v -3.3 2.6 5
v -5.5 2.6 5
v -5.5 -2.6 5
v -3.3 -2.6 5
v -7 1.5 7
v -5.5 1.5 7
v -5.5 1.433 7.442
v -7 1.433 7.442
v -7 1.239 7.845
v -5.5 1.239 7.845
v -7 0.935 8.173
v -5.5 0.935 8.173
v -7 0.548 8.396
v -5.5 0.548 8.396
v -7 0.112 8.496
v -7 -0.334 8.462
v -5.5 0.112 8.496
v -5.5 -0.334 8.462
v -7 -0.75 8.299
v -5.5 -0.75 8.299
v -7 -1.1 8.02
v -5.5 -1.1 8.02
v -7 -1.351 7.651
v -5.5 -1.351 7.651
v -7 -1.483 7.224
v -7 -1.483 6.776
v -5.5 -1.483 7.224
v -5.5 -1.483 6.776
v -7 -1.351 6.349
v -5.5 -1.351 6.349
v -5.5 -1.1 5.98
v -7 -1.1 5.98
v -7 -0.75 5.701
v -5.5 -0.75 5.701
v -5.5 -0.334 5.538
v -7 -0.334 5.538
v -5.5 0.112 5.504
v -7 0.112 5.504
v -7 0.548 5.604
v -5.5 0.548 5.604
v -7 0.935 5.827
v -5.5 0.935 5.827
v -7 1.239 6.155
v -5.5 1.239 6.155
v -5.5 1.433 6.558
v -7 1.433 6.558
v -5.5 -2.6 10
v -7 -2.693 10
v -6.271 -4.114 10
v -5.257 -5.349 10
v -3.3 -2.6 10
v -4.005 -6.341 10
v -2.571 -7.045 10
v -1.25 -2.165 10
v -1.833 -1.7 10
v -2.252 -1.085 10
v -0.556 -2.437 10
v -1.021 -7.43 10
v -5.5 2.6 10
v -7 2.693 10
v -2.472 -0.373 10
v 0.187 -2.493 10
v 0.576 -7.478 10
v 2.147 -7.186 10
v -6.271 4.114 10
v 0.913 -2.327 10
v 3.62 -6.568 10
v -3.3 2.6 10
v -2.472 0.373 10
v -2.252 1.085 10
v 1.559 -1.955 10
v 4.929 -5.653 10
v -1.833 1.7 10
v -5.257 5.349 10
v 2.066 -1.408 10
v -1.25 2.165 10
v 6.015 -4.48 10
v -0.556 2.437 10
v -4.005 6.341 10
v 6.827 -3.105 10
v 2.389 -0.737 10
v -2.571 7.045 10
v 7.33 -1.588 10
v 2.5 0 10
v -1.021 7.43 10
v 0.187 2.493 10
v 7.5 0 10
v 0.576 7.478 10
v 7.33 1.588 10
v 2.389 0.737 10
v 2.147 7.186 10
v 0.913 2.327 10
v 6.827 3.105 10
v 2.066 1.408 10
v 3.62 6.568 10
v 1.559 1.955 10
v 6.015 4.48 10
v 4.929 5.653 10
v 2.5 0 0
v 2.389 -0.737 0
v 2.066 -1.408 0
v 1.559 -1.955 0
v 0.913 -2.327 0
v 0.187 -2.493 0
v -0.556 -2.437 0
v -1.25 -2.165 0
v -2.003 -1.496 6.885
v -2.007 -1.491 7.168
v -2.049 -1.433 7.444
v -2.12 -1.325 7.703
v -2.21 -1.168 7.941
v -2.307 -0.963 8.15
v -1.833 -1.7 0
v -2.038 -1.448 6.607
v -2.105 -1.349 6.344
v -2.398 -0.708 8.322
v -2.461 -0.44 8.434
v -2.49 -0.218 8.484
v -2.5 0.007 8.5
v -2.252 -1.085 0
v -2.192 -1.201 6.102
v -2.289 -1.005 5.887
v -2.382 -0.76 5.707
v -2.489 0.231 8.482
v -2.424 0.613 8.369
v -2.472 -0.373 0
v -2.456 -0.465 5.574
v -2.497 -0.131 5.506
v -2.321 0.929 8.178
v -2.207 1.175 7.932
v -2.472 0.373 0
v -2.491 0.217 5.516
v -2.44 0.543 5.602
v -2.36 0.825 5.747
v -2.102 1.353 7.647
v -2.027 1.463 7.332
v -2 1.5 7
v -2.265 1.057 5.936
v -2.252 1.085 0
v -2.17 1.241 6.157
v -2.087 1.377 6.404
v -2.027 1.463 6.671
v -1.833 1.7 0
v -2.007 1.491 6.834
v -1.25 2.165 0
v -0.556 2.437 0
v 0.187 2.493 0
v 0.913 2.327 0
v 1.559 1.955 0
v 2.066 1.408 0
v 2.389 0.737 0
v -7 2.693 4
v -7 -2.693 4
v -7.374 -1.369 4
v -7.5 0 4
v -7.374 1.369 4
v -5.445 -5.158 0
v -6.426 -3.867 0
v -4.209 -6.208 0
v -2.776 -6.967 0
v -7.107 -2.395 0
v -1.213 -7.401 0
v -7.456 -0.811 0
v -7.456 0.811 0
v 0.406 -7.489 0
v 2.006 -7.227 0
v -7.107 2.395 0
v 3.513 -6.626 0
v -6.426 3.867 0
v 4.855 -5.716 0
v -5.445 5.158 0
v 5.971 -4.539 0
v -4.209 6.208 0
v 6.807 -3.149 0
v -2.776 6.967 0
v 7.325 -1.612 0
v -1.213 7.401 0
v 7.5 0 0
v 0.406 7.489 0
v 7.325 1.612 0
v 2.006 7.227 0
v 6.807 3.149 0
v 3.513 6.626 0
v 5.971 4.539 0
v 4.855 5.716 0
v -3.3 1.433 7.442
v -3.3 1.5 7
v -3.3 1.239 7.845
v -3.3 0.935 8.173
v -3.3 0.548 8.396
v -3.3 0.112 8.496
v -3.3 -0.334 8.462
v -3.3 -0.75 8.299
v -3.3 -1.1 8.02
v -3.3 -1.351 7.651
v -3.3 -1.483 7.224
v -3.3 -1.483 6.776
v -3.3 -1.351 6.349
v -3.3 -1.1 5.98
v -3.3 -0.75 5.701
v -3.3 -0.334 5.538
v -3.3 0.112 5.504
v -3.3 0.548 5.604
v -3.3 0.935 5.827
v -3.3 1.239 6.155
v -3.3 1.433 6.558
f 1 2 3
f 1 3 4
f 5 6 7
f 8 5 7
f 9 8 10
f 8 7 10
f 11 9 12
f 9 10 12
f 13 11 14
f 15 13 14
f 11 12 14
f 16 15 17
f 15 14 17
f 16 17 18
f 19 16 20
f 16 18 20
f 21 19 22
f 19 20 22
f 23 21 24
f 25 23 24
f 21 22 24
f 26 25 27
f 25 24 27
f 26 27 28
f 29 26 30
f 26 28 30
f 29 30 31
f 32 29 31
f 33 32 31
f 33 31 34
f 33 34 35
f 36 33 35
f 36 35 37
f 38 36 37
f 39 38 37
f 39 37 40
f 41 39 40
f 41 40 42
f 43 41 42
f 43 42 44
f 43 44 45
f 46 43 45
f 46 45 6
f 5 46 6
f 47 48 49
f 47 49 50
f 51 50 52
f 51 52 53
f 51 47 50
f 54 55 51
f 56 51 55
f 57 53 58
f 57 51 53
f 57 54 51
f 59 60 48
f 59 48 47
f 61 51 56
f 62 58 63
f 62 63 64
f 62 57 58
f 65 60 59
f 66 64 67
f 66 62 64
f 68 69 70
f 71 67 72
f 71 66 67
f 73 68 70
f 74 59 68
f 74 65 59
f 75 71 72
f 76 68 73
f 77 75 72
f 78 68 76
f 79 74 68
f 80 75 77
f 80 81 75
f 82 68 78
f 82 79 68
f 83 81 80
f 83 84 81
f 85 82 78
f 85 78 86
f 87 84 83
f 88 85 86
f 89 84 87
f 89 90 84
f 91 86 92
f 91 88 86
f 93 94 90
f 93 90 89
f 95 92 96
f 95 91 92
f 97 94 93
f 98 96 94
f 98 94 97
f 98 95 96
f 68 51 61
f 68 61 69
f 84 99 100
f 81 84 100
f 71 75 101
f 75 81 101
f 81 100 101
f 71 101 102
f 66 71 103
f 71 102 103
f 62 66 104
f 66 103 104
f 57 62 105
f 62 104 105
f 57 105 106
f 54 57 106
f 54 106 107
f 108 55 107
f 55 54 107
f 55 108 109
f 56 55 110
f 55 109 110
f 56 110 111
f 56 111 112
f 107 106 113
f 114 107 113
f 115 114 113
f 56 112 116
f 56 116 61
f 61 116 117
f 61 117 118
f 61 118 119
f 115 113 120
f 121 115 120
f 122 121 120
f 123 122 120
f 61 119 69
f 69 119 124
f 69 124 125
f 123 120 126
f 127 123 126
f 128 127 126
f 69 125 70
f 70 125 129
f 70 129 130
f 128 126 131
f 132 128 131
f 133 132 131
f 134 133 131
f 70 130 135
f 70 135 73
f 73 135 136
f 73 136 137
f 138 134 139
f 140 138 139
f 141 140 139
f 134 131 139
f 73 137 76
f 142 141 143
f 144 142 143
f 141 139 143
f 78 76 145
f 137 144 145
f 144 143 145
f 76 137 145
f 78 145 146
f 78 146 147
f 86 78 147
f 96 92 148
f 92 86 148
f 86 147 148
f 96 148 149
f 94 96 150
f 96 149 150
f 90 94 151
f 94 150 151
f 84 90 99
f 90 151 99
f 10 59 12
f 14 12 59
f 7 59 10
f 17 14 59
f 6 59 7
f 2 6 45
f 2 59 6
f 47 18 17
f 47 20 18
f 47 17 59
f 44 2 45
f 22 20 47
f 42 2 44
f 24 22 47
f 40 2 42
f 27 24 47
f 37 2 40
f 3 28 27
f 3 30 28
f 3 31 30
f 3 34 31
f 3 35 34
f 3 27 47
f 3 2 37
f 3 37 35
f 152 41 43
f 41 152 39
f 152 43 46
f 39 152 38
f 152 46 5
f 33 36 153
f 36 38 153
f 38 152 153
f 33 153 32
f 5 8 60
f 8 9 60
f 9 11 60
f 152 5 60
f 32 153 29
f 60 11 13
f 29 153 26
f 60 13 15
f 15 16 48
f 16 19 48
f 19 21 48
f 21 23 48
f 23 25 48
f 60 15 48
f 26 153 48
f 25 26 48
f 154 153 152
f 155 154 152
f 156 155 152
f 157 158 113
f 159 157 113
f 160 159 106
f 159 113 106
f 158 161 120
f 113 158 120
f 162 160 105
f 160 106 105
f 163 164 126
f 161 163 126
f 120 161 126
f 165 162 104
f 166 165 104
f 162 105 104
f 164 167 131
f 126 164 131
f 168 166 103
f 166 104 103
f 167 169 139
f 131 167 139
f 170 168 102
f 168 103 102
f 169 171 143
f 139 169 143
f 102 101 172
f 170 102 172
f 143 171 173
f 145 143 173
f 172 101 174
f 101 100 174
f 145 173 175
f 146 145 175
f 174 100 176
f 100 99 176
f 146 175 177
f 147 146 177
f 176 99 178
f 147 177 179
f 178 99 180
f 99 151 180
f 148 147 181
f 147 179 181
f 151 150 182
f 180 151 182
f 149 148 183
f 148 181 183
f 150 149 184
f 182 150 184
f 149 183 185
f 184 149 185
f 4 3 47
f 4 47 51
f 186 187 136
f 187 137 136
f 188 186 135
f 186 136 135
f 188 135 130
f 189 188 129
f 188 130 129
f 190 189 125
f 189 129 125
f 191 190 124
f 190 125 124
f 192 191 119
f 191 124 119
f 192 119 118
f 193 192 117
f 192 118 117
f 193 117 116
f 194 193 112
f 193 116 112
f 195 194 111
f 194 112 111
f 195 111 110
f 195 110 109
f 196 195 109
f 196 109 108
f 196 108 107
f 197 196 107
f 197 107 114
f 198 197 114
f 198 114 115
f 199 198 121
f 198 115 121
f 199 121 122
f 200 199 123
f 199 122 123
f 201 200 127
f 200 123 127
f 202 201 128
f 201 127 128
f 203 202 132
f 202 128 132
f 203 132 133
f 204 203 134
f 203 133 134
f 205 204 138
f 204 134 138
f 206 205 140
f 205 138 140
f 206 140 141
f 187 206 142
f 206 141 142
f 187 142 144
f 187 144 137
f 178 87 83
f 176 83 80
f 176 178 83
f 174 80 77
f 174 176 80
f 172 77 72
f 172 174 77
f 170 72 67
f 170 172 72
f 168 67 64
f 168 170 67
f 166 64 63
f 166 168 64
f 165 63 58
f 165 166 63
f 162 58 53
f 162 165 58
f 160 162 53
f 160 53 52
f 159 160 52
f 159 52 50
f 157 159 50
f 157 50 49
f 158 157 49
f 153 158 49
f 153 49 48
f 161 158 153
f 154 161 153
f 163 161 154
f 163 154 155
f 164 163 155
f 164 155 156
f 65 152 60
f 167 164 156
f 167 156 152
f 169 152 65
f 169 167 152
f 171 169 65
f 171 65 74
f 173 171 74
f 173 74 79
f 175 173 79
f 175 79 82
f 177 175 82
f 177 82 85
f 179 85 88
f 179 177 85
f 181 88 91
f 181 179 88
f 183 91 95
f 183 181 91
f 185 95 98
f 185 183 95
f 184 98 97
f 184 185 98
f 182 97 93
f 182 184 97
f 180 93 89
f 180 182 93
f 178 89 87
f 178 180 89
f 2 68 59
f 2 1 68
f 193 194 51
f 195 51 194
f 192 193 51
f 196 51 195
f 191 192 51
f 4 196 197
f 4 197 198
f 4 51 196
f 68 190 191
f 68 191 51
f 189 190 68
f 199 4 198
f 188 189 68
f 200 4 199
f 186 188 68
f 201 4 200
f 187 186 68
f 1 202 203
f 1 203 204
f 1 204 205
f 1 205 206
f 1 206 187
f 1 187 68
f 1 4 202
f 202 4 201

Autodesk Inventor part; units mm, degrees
ref_plane "YZ Plane" through (0, 0, 0) normal (1, 0, 0) x (0, 1, 0)
ref_plane "XZ Plane" through (0, 0, 0) normal (0, 1, 0) x (-1, 0, 0)
sketch "Sketch1" plane through (0, 0, 0) normal (0, 0, 1) x (1, 0, 0)
  circle A0 centre (0, 0) radius 7.5
  circle A1 centre (0, 0) radius 2.5
  dimension "d0" = 15
  dimension "d1" = 5
extrude "Extrusion1" add sketch "Sketch1" along normal blind 10
ref_plane "Work Plane1" through (0, 0, 5) normal (0, 0, 1) x (1, 0, 0)
sketch "Sketch2" plane through (0, 0, 5) normal (0, 0, 1) x (1, 0, 0)
  line L0 (-5.5, -2.6) -> (-3.3, -2.6)
  line L1 (-3.3, -2.6) -> (-3.3, 2.6)
  line L2 (-3.3, 2.6) -> (-5.5, 2.6)
  line L3 (-5.5, 2.6) -> (-5.5, -2.6)
  point P0 (0, 0)
  point P1 (-5.5, 0)
  dimension "d5" = 5.5
  dimension "d6" = 2.2
  dimension "d7" = 5.2
extrude "Extrusion2" cut sketch "Sketch2" along normal blind 5
sketch "Sketch4" plane through (0, 0, 0) normal (1, 0, 0) x (0, 1, 0)
  circle A0 centre (0, 7) radius 1.5
  line L0 (-10.5, 0) -> (10.5, 0) projected
  point P0 (0, 0)
  dimension "d12" = 3
  dimension "d13" = 7
extrude "Extrusion3" cut sketch "Sketch4" against normal blind 8
sketch "Sketch5" plane through (0, 0, 0) normal (0, 1, 0) x (-1, 0, 0)
  line L0 (7.5, 0) -> (7.5, 10) projected
  line L1 (7.5, 4) -> (7, 4)
  line L2 (7, 4) -> (7, 10)
  line L3 (7, 10) -> (7.5, 10)
  line L4 (7.5, 10) -> (7.5, 4)
  line L5 (-10.5003, 0) -> (10.5017, 0) projected
  point P0 (0, 0)
  dimension "d16" = 6
  dimension "d17" = 10
  dimension "d18" = 0.5
extrude "Extrusion4" cut sketch "Sketch5" along normal mid plane 8
properties part number "Acople eje motor"
